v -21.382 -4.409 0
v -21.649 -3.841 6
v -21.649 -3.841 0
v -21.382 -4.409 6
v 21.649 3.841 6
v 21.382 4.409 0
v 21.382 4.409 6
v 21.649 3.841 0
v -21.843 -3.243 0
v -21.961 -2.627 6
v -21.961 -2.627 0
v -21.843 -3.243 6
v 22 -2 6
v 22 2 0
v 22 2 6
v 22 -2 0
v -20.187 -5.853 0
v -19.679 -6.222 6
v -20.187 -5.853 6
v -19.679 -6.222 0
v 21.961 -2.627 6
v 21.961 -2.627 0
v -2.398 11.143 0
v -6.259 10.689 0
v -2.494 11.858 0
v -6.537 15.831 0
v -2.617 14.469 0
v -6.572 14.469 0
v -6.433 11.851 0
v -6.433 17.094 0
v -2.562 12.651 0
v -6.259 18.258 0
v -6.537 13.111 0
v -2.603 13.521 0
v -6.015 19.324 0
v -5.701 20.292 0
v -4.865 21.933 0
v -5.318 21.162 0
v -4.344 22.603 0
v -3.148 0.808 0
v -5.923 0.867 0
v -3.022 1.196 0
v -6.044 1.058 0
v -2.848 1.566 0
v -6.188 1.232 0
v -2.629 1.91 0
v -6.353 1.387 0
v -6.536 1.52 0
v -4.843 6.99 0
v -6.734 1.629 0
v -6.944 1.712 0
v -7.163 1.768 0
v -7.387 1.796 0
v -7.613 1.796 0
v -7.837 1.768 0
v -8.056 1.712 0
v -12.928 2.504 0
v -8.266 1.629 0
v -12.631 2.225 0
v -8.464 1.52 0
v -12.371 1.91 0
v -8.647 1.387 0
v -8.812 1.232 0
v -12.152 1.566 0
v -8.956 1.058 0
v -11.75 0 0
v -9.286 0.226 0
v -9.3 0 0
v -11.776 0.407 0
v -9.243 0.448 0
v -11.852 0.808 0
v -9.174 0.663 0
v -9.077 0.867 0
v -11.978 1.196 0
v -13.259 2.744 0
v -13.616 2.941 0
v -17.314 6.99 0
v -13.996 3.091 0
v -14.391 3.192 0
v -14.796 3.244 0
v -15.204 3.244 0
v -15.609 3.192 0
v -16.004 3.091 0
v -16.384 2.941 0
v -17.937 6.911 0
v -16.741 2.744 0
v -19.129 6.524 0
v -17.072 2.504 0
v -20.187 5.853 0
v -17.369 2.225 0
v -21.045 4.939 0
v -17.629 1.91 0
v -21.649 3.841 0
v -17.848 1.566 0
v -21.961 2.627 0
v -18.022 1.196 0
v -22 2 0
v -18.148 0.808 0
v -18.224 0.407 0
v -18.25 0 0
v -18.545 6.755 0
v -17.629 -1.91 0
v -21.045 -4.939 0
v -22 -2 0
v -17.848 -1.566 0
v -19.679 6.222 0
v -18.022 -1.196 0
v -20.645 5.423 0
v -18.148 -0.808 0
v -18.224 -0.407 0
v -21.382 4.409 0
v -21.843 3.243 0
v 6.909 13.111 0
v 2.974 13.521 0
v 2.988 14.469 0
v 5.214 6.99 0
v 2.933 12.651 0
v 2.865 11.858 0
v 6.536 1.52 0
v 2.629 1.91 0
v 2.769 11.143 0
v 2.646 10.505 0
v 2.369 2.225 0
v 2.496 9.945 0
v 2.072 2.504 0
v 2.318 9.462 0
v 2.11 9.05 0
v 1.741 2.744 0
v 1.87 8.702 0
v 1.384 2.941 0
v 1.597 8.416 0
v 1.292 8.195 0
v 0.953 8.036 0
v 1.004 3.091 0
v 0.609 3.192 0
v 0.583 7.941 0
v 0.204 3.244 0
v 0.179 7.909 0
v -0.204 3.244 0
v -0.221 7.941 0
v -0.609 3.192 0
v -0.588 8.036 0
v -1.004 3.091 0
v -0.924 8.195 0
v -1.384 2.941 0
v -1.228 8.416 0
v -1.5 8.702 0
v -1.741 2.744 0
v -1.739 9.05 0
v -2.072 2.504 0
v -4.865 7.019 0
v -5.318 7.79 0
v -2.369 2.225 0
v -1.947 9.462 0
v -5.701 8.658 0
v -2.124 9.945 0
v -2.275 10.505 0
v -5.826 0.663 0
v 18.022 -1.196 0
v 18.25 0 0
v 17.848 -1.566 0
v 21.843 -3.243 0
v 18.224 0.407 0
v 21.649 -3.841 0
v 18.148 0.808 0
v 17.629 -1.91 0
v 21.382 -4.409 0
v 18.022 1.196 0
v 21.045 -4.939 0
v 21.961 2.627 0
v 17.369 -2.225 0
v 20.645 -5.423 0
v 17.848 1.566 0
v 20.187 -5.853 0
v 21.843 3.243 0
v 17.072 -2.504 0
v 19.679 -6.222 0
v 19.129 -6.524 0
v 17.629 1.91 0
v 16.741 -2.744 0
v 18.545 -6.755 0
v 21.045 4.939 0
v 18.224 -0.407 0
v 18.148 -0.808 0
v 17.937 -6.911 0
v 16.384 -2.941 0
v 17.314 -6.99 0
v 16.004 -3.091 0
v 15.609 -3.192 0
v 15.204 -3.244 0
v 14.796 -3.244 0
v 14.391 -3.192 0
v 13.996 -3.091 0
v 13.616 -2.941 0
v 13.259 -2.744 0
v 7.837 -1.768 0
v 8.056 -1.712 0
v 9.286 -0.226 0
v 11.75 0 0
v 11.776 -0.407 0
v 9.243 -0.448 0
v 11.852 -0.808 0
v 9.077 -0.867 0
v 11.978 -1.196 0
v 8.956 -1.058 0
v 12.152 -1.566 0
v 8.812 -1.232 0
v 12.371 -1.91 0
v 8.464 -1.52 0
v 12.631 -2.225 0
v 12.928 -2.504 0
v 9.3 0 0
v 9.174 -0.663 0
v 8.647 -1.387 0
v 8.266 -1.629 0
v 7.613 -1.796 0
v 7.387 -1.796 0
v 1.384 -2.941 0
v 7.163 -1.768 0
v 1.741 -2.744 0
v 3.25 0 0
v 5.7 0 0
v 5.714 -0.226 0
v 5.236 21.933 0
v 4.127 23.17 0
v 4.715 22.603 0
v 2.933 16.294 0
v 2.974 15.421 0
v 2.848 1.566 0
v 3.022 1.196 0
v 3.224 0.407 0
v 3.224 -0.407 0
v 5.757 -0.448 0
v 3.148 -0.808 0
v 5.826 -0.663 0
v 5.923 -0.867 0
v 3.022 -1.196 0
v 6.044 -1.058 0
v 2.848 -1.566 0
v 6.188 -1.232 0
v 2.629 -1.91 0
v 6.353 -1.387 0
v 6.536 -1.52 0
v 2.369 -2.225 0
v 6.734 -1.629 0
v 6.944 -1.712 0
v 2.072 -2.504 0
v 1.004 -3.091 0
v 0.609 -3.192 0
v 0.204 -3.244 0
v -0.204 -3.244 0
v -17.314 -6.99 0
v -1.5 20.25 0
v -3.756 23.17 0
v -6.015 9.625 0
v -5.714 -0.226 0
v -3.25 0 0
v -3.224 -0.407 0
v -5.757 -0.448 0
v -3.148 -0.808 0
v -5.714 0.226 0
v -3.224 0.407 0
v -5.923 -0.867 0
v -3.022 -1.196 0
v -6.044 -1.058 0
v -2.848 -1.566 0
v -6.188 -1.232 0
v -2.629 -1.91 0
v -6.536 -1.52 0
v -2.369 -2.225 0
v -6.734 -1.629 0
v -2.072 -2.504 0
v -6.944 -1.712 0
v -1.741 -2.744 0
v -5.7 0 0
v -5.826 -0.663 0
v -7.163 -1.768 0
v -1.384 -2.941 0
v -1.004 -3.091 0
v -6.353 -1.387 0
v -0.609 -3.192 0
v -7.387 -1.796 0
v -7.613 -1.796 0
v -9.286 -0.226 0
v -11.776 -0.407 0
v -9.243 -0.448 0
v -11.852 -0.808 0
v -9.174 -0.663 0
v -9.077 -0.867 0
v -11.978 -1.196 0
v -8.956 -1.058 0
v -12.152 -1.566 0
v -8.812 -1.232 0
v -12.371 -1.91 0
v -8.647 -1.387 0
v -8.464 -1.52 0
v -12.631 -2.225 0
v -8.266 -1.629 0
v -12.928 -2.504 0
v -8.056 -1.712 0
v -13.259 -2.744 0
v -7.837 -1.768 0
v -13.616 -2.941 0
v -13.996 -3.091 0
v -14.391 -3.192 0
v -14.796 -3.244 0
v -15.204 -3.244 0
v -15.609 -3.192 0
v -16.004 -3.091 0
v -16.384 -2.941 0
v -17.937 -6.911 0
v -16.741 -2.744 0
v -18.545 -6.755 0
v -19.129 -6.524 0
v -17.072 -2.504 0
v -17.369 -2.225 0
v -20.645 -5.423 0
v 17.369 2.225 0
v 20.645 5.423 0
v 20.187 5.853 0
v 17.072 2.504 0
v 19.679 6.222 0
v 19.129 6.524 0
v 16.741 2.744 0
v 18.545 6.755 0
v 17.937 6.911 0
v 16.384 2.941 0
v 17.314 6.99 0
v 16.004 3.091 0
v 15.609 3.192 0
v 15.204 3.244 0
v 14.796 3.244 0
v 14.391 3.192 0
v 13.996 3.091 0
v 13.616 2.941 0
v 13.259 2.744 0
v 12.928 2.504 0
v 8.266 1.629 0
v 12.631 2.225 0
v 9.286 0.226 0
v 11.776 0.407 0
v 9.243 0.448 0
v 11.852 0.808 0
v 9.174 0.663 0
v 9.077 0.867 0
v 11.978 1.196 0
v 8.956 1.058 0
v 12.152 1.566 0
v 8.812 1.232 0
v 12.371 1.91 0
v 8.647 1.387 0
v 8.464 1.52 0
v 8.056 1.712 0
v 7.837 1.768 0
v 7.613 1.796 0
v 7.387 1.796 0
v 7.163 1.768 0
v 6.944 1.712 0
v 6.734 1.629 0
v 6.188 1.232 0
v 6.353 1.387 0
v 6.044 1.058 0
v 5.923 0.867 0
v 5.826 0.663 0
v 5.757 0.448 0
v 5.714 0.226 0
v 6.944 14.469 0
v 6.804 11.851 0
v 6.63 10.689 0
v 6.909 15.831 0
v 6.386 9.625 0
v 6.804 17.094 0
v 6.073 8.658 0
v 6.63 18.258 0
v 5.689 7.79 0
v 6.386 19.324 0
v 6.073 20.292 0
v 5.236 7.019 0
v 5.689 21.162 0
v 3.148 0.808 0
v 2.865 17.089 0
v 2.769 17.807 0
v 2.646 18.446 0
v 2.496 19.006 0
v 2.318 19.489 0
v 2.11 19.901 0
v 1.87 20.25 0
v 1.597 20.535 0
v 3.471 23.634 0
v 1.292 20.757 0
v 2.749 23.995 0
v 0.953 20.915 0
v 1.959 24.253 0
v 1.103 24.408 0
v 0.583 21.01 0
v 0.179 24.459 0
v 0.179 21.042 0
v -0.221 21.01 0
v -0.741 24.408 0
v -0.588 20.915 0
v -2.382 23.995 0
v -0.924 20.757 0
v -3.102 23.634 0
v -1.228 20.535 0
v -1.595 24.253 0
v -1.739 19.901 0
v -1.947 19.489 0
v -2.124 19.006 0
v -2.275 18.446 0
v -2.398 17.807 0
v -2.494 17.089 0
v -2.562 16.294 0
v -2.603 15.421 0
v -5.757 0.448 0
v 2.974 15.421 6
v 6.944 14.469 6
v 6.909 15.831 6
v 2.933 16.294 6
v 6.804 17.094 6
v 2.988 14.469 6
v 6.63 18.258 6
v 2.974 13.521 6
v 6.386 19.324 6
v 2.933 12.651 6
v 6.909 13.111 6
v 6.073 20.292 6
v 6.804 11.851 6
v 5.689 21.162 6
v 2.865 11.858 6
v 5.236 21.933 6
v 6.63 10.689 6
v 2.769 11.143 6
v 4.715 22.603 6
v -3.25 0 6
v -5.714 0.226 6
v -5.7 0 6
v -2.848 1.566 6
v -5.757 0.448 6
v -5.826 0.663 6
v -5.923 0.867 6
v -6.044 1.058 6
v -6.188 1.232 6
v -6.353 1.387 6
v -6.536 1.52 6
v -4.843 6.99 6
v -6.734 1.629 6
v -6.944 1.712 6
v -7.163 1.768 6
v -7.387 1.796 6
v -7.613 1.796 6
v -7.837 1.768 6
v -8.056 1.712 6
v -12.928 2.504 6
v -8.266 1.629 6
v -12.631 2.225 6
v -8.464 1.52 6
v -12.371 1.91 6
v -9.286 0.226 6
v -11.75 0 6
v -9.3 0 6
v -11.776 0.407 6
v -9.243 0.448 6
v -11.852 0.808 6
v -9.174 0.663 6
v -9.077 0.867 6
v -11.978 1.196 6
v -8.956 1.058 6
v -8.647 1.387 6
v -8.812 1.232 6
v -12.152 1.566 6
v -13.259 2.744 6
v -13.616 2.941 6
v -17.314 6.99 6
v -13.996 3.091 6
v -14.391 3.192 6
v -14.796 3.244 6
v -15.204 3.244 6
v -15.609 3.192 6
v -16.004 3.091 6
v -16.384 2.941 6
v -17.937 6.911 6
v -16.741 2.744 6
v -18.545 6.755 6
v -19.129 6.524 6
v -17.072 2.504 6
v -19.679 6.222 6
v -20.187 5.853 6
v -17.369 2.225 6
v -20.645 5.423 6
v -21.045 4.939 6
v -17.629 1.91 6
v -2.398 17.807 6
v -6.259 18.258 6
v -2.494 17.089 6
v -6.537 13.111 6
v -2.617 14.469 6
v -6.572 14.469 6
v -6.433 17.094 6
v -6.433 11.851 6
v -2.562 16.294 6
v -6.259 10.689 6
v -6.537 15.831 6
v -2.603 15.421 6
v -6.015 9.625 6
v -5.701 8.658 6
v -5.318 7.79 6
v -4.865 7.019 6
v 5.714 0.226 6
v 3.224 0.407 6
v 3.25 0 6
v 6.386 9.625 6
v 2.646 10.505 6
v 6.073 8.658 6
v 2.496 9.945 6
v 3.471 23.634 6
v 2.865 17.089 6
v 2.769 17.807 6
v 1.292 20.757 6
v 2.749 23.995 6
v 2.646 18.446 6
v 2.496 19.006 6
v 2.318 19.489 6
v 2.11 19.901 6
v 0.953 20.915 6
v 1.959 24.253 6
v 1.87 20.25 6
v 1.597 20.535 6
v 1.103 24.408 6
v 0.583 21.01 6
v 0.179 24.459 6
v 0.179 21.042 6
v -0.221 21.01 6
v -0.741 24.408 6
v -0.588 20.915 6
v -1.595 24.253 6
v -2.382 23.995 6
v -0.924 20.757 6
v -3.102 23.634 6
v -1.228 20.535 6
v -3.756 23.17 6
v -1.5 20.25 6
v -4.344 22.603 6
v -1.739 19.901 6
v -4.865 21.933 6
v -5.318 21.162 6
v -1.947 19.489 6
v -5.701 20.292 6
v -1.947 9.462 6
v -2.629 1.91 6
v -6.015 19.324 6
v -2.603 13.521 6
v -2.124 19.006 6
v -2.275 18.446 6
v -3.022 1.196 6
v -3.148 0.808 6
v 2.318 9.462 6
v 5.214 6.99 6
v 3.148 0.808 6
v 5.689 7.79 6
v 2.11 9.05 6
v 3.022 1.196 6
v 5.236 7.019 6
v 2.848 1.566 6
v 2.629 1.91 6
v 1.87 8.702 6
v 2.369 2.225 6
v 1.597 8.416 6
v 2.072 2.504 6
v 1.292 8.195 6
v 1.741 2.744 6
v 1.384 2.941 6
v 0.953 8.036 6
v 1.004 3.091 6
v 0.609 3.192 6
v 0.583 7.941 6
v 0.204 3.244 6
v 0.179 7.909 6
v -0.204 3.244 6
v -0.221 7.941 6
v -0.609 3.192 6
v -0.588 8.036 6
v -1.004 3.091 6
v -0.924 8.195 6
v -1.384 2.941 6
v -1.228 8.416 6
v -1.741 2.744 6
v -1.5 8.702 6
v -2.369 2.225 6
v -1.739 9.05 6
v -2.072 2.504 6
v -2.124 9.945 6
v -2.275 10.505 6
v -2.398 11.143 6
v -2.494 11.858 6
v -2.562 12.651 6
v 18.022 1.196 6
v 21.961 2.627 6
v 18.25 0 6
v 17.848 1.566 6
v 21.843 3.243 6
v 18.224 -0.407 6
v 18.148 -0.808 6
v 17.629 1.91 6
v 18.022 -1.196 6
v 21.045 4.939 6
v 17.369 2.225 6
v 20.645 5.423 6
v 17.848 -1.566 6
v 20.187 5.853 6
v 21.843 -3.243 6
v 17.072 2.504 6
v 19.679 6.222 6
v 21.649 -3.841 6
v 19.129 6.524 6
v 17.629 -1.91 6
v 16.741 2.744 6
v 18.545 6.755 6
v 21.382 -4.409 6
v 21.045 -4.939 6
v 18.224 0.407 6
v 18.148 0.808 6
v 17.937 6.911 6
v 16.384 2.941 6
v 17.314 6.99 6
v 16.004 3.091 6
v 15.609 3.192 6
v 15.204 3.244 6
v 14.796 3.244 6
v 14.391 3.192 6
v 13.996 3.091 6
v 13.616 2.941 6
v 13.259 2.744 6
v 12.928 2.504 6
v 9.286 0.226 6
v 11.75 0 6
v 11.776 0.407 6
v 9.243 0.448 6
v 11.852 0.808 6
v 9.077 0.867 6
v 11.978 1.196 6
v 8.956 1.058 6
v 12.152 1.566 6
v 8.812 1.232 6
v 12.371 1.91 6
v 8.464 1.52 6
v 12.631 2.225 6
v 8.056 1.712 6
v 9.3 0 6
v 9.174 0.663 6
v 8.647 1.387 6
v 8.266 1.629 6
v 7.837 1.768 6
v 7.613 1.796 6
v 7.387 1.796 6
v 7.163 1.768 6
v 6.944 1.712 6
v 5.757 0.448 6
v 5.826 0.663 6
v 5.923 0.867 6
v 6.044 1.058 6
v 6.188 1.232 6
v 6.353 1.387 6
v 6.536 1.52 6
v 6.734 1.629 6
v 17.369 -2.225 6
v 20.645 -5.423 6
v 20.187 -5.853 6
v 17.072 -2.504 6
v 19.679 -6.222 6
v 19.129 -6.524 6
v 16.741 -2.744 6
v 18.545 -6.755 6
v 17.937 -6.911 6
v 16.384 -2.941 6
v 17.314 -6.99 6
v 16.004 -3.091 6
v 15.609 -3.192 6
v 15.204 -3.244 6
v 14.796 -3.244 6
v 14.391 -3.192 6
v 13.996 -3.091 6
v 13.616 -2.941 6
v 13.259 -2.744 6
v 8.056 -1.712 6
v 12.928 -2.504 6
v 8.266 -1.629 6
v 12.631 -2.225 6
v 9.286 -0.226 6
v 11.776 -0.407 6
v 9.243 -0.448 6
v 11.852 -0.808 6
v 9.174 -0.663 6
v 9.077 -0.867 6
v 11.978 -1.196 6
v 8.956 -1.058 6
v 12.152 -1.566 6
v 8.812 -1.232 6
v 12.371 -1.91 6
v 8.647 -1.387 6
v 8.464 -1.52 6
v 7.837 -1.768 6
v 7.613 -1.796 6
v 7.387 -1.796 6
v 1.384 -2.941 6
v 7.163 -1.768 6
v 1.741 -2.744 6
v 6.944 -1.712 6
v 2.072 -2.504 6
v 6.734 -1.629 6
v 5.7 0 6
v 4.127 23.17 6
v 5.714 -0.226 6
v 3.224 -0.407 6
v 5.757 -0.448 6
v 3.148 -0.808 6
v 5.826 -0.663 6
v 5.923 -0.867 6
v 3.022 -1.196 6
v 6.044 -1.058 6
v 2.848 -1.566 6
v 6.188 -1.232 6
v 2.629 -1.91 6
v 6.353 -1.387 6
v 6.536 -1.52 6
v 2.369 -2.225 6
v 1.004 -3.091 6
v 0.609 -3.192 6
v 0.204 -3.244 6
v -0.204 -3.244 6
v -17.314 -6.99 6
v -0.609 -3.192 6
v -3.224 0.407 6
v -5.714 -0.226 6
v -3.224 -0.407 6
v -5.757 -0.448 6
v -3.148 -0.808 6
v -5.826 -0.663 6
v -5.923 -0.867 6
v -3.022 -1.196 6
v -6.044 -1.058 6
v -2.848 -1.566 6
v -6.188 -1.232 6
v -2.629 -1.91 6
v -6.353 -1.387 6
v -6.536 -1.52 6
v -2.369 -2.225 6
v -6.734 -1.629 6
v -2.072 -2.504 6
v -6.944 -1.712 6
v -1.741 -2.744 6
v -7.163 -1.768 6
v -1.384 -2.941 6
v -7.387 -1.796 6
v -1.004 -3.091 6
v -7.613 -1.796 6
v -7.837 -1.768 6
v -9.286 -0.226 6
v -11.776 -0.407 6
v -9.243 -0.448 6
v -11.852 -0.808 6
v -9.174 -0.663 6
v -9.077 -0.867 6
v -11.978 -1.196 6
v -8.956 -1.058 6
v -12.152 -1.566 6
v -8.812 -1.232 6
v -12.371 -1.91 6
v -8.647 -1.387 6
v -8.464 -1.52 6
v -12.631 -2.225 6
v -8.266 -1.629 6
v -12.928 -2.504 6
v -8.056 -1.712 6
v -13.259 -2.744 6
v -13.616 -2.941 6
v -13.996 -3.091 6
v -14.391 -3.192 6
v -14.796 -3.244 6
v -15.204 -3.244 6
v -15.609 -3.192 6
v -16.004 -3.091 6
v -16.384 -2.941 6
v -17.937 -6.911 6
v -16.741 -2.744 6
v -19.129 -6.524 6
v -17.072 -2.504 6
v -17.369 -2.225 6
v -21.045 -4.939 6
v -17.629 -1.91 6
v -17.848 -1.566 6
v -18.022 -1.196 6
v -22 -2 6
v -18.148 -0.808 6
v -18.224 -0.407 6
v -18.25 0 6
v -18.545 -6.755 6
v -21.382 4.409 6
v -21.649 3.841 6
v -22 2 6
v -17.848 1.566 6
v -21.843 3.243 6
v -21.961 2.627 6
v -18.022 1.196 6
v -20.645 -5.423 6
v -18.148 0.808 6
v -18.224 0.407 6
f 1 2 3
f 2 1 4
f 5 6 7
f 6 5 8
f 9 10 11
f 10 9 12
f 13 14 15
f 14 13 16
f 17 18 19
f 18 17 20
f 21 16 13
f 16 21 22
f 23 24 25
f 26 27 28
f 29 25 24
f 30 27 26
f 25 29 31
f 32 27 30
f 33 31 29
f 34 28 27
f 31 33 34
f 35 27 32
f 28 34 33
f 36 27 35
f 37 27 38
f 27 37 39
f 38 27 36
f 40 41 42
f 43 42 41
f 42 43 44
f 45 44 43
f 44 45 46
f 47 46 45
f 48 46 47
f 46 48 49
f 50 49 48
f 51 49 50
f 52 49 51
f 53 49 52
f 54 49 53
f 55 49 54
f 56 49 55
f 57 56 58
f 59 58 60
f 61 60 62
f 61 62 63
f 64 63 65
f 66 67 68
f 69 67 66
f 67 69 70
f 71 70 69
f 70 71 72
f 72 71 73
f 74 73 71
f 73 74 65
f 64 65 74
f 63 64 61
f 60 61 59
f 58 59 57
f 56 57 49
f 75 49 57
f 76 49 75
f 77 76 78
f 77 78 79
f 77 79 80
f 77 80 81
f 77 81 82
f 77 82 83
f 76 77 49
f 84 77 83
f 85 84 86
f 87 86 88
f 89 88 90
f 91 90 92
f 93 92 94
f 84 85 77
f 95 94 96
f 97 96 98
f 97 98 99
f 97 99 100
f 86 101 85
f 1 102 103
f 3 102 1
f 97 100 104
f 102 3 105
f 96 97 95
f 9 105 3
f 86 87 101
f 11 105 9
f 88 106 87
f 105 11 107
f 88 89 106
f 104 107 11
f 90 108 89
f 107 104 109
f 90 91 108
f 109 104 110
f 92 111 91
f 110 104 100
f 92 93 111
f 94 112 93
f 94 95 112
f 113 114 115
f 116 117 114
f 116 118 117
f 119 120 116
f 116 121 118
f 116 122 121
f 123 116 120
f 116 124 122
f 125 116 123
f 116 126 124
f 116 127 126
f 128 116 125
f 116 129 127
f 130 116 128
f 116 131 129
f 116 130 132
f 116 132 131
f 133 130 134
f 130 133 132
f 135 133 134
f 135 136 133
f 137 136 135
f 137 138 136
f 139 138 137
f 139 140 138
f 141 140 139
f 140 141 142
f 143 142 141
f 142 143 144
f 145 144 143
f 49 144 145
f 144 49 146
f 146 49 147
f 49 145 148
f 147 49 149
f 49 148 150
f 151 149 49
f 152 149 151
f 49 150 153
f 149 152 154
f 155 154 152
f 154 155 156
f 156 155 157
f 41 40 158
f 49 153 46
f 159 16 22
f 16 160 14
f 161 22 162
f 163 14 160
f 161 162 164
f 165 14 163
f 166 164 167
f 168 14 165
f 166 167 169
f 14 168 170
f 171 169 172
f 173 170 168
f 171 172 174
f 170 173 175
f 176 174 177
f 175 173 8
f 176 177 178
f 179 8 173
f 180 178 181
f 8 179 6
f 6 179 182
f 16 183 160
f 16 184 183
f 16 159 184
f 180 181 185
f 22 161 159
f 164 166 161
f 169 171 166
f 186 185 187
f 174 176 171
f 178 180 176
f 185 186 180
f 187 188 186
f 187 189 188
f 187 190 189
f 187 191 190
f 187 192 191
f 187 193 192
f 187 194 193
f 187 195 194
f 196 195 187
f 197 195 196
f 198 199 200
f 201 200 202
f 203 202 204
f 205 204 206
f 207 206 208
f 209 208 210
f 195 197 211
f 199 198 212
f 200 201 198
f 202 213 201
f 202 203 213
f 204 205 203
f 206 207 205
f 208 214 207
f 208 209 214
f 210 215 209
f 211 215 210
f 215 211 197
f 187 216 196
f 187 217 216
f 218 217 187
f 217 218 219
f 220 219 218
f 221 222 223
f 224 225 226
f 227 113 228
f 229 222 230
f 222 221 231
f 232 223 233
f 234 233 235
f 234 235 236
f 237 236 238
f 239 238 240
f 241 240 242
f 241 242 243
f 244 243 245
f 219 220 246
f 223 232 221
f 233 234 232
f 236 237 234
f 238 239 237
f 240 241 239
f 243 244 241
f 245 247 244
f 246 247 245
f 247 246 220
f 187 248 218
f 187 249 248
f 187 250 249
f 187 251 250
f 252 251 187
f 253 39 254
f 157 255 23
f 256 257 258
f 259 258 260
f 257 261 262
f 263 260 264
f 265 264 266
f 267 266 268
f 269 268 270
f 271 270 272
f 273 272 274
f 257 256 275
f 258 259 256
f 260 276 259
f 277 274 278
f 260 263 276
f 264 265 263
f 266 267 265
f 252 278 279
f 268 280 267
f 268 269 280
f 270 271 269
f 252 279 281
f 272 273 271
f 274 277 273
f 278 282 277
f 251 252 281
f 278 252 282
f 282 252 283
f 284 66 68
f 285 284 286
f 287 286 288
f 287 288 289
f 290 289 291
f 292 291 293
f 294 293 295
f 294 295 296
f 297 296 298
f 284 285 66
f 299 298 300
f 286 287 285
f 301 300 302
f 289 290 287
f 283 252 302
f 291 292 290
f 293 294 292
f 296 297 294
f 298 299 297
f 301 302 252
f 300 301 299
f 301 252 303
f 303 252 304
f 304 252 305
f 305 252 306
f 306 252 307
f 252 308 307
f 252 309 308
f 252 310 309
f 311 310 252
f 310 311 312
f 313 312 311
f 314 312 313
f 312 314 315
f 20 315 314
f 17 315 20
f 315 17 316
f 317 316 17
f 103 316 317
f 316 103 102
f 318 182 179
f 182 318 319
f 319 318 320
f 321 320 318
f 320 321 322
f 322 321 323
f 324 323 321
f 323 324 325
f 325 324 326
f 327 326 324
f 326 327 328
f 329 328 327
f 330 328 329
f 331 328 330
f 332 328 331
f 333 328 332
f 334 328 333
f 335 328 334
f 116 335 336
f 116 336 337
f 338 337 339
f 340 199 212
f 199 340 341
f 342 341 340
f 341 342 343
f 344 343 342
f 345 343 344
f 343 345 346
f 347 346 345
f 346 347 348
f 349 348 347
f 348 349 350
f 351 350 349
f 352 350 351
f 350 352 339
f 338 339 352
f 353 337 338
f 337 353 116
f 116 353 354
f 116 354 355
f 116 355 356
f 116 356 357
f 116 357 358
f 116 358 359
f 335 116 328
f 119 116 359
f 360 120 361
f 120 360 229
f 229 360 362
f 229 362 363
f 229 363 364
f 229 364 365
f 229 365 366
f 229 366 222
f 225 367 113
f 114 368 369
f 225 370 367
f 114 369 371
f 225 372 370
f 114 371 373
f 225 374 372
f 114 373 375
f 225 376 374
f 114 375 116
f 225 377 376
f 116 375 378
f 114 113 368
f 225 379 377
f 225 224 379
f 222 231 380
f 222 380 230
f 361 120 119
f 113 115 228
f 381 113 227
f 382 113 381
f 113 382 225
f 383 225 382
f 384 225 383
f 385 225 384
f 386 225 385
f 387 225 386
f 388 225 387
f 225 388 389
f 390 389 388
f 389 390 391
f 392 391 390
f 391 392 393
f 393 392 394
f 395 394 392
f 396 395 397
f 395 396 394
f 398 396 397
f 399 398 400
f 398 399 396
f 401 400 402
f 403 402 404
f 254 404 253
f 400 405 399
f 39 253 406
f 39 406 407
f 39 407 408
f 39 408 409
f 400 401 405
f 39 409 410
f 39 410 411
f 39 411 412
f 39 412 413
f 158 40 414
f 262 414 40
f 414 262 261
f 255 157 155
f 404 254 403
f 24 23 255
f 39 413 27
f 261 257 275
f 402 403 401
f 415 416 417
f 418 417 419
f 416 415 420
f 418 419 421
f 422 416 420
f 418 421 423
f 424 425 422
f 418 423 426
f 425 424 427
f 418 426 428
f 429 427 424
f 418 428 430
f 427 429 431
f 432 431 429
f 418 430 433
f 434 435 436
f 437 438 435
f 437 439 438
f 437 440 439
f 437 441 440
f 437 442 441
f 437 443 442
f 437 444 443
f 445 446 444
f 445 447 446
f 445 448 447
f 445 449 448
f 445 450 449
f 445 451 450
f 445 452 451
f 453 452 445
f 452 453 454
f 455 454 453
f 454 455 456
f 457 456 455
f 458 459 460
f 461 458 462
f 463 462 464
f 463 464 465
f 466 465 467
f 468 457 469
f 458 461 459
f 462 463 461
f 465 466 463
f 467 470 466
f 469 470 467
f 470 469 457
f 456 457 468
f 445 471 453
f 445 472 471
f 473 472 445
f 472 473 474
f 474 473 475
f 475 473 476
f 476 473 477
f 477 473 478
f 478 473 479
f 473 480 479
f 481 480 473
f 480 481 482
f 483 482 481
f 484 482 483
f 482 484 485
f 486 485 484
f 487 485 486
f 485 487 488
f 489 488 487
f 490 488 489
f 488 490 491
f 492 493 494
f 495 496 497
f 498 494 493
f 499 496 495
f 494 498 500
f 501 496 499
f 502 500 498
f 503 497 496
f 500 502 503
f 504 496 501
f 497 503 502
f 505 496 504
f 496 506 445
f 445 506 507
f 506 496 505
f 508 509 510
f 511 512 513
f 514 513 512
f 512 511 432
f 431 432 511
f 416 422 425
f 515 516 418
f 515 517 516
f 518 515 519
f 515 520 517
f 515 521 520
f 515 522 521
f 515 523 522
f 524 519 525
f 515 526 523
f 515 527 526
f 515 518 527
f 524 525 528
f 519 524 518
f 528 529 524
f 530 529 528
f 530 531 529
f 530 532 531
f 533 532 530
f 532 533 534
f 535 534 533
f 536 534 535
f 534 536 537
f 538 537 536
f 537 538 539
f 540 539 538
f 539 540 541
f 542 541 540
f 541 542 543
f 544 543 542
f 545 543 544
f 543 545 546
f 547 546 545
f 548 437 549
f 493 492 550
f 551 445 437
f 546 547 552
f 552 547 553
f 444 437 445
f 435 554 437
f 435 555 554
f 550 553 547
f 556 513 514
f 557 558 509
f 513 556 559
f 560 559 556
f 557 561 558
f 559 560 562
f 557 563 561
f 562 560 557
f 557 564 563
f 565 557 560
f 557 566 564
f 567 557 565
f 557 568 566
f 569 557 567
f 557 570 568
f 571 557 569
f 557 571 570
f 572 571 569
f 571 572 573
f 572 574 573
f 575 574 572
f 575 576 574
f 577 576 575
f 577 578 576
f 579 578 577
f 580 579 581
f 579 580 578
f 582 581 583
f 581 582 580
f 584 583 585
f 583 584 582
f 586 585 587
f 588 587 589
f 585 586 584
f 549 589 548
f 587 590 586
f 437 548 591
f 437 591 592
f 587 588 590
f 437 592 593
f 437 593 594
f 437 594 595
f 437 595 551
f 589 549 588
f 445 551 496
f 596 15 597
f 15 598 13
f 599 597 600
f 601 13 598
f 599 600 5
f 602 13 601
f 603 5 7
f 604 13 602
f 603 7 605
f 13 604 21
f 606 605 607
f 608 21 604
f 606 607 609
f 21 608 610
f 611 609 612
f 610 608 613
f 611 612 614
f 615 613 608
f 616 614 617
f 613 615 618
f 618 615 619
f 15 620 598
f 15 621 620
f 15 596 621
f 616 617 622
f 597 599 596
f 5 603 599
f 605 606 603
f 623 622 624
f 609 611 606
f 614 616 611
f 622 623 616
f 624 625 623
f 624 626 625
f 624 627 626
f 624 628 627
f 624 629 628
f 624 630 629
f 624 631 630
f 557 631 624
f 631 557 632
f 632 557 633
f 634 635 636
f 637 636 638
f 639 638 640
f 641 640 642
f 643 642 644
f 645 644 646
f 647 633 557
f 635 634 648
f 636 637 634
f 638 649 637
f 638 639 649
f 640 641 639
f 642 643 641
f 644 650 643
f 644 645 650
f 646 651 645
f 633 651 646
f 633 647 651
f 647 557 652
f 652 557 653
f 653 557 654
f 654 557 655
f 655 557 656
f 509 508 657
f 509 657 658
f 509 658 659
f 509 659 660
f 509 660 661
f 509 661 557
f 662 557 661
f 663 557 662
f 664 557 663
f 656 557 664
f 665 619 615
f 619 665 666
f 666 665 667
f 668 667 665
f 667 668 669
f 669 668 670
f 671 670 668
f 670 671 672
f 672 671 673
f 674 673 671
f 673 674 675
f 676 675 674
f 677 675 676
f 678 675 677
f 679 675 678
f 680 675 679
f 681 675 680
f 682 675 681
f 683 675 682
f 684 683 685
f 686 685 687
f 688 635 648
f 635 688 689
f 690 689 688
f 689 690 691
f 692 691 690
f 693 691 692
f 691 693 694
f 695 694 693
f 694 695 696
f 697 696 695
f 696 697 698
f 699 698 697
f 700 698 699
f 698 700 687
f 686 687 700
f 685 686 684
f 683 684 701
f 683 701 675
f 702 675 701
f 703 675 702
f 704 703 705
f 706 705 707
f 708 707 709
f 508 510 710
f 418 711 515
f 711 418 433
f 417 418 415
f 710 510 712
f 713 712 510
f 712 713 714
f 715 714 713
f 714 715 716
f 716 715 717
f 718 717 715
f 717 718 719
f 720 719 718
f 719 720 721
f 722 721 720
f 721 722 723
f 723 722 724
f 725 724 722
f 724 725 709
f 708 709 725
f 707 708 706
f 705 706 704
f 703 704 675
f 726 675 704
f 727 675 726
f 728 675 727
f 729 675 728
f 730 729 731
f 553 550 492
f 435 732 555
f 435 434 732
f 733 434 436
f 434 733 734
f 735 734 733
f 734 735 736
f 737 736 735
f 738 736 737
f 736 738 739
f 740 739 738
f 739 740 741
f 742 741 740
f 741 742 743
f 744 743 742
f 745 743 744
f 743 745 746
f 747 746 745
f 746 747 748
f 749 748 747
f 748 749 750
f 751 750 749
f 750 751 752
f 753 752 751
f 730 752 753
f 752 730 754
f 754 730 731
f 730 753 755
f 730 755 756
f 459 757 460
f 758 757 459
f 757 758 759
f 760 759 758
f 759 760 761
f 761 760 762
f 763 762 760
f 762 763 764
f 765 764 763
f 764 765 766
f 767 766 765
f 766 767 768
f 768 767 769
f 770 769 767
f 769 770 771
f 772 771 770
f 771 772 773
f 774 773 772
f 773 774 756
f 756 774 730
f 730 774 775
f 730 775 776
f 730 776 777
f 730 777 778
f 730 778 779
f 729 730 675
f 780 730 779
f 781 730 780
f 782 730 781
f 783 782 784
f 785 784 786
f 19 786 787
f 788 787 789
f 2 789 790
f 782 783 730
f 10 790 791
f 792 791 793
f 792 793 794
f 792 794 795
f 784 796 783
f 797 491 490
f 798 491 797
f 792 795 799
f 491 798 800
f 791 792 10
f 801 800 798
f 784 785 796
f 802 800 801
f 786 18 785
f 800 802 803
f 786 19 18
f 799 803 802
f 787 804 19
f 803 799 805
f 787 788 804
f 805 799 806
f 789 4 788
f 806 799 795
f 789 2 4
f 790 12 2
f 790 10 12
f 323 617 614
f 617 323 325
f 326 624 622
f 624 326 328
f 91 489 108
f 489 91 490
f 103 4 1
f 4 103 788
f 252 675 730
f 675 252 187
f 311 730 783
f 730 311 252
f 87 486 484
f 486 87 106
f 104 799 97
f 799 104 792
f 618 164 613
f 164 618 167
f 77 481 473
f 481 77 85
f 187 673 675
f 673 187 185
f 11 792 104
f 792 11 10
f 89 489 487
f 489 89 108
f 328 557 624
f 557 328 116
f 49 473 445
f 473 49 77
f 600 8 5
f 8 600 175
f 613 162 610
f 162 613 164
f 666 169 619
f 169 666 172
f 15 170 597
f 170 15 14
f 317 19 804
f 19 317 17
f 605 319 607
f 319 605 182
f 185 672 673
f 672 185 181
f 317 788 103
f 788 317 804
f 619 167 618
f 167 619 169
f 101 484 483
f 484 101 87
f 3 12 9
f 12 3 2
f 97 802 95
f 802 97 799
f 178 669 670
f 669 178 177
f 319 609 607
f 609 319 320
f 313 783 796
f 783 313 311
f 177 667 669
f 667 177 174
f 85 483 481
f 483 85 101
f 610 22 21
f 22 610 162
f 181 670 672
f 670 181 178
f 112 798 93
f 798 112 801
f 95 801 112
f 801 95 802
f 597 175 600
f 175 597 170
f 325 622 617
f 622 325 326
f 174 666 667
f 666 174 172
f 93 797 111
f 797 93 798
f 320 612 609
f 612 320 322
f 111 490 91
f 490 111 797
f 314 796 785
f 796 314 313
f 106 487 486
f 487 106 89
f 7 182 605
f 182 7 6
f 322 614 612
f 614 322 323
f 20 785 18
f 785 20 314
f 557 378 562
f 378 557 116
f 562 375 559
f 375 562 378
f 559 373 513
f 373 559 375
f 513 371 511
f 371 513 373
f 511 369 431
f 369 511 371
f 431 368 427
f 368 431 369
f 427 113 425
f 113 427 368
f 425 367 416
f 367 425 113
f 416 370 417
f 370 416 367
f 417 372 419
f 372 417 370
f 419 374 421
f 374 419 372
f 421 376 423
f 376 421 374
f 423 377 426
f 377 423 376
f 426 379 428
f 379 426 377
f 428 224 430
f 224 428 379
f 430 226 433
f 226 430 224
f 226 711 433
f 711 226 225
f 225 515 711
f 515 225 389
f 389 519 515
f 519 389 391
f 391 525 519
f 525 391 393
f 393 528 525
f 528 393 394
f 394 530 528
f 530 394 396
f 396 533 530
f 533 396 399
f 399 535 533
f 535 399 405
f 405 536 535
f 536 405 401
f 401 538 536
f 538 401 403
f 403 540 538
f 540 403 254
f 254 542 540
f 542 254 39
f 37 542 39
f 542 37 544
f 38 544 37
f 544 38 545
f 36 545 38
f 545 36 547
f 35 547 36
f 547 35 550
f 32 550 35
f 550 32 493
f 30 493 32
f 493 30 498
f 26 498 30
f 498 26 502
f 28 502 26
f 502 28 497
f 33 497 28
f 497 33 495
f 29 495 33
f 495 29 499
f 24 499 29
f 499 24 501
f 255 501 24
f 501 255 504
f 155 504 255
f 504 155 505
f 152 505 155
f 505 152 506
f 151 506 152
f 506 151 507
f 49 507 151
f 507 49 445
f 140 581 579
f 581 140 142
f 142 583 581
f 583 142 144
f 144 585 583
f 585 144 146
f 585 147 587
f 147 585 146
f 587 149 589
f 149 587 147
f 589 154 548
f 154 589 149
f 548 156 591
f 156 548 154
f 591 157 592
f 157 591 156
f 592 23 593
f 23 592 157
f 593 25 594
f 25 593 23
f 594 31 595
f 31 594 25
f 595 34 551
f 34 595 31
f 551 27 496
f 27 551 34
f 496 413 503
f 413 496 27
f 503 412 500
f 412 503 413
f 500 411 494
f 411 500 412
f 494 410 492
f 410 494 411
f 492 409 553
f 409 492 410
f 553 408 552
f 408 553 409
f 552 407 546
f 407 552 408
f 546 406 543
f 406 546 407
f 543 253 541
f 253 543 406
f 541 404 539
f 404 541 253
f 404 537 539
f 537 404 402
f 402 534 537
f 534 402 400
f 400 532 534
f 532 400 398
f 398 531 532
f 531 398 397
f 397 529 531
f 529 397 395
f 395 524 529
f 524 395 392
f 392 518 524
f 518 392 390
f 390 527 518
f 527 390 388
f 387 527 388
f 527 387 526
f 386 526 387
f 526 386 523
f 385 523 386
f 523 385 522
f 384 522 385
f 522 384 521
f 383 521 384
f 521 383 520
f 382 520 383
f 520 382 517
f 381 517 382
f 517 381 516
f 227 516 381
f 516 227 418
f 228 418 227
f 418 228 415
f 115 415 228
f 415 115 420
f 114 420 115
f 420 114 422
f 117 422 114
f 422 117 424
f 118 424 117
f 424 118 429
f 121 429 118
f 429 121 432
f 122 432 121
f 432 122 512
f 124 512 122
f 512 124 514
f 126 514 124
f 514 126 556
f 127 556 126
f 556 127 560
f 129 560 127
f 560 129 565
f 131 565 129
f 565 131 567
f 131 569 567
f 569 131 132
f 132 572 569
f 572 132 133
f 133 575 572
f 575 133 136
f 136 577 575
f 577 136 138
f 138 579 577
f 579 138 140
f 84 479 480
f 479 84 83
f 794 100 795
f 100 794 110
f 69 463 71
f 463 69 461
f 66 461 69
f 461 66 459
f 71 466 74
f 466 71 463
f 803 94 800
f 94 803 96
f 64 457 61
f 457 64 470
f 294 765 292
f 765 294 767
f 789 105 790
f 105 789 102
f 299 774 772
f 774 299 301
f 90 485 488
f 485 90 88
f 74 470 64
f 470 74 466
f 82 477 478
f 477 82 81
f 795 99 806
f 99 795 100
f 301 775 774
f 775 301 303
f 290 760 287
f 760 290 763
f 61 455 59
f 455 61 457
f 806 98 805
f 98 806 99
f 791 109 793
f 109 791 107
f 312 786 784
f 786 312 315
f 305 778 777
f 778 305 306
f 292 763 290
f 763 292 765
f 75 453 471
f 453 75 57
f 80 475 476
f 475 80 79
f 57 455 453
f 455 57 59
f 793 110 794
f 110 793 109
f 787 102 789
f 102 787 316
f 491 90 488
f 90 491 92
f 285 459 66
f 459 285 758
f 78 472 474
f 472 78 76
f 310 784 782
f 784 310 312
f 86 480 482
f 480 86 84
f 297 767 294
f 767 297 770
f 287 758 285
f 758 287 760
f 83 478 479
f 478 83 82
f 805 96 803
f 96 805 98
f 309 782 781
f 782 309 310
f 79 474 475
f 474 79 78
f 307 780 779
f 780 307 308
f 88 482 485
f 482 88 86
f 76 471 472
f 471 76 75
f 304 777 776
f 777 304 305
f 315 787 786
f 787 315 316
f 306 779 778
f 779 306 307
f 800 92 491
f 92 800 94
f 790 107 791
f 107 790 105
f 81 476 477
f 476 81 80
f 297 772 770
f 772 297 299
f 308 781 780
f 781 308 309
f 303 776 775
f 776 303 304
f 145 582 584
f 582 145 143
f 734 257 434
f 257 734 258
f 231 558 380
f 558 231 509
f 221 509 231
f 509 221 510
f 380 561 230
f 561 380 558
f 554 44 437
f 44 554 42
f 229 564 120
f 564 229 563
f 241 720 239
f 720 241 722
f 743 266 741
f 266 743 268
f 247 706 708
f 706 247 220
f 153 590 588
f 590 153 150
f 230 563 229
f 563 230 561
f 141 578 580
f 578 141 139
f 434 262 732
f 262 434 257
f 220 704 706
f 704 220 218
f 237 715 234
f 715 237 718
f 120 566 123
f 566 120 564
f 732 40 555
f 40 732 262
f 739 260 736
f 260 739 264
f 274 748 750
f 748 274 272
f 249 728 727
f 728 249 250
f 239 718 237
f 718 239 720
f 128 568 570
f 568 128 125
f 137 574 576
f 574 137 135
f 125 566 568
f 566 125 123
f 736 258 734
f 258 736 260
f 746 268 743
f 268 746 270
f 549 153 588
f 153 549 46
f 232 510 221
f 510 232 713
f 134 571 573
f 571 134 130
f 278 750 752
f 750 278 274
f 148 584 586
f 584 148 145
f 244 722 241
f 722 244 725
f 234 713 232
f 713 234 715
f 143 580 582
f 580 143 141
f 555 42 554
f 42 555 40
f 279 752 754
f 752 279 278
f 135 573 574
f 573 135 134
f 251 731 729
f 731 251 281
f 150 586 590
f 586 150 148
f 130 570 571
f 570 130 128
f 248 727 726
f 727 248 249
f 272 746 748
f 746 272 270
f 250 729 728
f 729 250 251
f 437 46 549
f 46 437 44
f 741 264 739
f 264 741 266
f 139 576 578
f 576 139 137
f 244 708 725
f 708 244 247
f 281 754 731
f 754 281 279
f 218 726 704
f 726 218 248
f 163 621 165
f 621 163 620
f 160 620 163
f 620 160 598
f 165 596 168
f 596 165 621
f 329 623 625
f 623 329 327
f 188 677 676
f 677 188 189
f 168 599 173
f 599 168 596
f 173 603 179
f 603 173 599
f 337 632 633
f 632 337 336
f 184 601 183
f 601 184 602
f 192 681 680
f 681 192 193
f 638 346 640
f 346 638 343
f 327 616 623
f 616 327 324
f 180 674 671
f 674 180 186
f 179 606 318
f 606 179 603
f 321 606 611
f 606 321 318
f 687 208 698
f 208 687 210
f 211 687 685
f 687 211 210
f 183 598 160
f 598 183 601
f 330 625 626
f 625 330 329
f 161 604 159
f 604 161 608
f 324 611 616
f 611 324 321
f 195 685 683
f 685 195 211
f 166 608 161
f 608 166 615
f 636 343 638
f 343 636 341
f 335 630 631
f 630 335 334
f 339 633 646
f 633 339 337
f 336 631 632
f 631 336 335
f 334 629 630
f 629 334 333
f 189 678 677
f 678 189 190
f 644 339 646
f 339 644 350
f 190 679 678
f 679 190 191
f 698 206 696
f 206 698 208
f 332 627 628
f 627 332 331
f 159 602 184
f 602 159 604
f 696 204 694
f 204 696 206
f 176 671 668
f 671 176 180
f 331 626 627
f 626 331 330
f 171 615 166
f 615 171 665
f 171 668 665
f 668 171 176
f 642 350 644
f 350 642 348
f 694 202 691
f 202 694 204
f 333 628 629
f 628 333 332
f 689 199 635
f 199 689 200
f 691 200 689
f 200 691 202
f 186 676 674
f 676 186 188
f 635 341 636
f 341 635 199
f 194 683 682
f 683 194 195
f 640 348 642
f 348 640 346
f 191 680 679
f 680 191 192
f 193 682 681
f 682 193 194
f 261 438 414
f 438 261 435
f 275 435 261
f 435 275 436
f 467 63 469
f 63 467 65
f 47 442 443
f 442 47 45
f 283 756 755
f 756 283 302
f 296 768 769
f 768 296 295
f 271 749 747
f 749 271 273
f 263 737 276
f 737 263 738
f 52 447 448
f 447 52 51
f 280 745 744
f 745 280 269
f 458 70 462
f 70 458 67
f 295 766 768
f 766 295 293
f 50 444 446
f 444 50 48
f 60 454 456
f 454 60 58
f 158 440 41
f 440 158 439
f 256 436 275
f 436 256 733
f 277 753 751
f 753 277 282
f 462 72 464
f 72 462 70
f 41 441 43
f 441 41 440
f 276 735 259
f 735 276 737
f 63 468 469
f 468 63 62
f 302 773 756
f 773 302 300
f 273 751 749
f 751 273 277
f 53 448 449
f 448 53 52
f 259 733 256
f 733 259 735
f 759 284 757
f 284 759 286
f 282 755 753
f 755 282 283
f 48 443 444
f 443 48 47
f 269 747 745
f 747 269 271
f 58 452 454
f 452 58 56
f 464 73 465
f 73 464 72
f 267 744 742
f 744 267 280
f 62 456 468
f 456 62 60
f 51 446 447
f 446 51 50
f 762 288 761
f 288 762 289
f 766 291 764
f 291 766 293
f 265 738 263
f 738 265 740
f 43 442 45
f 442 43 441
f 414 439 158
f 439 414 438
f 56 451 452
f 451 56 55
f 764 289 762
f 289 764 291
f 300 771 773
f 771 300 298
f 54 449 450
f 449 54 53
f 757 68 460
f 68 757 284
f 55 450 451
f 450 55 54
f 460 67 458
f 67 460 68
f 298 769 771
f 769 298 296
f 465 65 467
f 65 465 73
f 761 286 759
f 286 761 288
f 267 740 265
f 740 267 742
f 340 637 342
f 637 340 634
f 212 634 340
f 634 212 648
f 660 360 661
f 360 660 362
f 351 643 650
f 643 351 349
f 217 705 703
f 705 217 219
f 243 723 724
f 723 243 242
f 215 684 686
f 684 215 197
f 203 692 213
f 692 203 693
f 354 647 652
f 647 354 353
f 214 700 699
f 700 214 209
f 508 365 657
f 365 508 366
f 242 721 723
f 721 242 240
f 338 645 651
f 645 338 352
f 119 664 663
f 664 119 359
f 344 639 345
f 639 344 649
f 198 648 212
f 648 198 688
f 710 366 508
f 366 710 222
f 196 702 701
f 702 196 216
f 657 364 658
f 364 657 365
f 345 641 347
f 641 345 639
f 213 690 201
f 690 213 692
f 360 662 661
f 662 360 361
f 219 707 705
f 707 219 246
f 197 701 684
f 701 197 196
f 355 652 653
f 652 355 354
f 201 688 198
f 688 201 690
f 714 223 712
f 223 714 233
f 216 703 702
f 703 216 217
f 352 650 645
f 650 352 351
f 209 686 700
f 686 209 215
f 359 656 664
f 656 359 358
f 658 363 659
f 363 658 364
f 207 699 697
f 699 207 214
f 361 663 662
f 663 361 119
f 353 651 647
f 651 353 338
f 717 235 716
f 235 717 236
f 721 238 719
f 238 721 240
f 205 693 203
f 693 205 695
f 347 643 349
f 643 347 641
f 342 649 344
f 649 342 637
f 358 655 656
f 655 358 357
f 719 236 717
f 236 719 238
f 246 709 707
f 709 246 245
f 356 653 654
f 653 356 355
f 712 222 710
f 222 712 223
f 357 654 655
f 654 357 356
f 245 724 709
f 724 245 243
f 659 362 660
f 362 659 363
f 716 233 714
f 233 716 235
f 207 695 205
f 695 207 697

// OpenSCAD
$fn = 50;


difference() {
	union() {
		hull() {
			translate(v = [-17.0000000000, 2.0000000000, 0]) {
				cylinder(h = 6, r = 5);
			}
			translate(v = [17.0000000000, 2.0000000000, 0]) {
				cylinder(h = 6, r = 5);
			}
			translate(v = [-17.0000000000, -2.0000000000, 0]) {
				cylinder(h = 6, r = 5);
			}
			translate(v = [17.0000000000, -2.0000000000, 0]) {
				cylinder(h = 6, r = 5);
			}
		}
		translate(v = [0, 24, 0]) {
			linear_extrude(height = 6) {
				text(font = "DejaVu Sans Mono:style=Bold", halign = "center", size = 19.0000000000, text = "O", valign = "top");
			}
		}
	}
	union() {
		translate(v = [-15.0000000000, 0.0000000000, 0]) {
			translate(v = [0, 0, -100]) {
				cylinder(h = 200, r = 3.2500000000);
			}
		}
		translate(v = [0, 0, -100]) {
			cylinder(h = 200, r = 3.2500000000);
		}
		translate(v = [15.0000000000, 0.0000000000, 0]) {
			translate(v = [0, 0, -100]) {
				cylinder(h = 200, r = 3.2500000000);
			}
		}
		translate(v = [-15.0000000000, 0.0000000000, 0]) {
			translate(v = [0, 0, -100]) {
				cylinder(h = 200, r = 1.8000000000);
			}
		}
		translate(v = [-7.5000000000, 0.0000000000, 0]) {
			translate(v = [0, 0, -100]) {
				cylinder(h = 200, r = 1.8000000000);
			}
		}
		translate(v = [0, 0, -100]) {
			cylinder(h = 200, r = 1.8000000000);
		}
		translate(v = [7.5000000000, 0.0000000000, 0]) {
			translate(v = [0, 0, -100]) {
				cylinder(h = 200, r = 1.8000000000);
			}
		}
		translate(v = [15.0000000000, 0.0000000000, 0]) {
			translate(v = [0, 0, -100]) {
				cylinder(h = 200, r = 1.8000000000);
			}
		}
	}
}
